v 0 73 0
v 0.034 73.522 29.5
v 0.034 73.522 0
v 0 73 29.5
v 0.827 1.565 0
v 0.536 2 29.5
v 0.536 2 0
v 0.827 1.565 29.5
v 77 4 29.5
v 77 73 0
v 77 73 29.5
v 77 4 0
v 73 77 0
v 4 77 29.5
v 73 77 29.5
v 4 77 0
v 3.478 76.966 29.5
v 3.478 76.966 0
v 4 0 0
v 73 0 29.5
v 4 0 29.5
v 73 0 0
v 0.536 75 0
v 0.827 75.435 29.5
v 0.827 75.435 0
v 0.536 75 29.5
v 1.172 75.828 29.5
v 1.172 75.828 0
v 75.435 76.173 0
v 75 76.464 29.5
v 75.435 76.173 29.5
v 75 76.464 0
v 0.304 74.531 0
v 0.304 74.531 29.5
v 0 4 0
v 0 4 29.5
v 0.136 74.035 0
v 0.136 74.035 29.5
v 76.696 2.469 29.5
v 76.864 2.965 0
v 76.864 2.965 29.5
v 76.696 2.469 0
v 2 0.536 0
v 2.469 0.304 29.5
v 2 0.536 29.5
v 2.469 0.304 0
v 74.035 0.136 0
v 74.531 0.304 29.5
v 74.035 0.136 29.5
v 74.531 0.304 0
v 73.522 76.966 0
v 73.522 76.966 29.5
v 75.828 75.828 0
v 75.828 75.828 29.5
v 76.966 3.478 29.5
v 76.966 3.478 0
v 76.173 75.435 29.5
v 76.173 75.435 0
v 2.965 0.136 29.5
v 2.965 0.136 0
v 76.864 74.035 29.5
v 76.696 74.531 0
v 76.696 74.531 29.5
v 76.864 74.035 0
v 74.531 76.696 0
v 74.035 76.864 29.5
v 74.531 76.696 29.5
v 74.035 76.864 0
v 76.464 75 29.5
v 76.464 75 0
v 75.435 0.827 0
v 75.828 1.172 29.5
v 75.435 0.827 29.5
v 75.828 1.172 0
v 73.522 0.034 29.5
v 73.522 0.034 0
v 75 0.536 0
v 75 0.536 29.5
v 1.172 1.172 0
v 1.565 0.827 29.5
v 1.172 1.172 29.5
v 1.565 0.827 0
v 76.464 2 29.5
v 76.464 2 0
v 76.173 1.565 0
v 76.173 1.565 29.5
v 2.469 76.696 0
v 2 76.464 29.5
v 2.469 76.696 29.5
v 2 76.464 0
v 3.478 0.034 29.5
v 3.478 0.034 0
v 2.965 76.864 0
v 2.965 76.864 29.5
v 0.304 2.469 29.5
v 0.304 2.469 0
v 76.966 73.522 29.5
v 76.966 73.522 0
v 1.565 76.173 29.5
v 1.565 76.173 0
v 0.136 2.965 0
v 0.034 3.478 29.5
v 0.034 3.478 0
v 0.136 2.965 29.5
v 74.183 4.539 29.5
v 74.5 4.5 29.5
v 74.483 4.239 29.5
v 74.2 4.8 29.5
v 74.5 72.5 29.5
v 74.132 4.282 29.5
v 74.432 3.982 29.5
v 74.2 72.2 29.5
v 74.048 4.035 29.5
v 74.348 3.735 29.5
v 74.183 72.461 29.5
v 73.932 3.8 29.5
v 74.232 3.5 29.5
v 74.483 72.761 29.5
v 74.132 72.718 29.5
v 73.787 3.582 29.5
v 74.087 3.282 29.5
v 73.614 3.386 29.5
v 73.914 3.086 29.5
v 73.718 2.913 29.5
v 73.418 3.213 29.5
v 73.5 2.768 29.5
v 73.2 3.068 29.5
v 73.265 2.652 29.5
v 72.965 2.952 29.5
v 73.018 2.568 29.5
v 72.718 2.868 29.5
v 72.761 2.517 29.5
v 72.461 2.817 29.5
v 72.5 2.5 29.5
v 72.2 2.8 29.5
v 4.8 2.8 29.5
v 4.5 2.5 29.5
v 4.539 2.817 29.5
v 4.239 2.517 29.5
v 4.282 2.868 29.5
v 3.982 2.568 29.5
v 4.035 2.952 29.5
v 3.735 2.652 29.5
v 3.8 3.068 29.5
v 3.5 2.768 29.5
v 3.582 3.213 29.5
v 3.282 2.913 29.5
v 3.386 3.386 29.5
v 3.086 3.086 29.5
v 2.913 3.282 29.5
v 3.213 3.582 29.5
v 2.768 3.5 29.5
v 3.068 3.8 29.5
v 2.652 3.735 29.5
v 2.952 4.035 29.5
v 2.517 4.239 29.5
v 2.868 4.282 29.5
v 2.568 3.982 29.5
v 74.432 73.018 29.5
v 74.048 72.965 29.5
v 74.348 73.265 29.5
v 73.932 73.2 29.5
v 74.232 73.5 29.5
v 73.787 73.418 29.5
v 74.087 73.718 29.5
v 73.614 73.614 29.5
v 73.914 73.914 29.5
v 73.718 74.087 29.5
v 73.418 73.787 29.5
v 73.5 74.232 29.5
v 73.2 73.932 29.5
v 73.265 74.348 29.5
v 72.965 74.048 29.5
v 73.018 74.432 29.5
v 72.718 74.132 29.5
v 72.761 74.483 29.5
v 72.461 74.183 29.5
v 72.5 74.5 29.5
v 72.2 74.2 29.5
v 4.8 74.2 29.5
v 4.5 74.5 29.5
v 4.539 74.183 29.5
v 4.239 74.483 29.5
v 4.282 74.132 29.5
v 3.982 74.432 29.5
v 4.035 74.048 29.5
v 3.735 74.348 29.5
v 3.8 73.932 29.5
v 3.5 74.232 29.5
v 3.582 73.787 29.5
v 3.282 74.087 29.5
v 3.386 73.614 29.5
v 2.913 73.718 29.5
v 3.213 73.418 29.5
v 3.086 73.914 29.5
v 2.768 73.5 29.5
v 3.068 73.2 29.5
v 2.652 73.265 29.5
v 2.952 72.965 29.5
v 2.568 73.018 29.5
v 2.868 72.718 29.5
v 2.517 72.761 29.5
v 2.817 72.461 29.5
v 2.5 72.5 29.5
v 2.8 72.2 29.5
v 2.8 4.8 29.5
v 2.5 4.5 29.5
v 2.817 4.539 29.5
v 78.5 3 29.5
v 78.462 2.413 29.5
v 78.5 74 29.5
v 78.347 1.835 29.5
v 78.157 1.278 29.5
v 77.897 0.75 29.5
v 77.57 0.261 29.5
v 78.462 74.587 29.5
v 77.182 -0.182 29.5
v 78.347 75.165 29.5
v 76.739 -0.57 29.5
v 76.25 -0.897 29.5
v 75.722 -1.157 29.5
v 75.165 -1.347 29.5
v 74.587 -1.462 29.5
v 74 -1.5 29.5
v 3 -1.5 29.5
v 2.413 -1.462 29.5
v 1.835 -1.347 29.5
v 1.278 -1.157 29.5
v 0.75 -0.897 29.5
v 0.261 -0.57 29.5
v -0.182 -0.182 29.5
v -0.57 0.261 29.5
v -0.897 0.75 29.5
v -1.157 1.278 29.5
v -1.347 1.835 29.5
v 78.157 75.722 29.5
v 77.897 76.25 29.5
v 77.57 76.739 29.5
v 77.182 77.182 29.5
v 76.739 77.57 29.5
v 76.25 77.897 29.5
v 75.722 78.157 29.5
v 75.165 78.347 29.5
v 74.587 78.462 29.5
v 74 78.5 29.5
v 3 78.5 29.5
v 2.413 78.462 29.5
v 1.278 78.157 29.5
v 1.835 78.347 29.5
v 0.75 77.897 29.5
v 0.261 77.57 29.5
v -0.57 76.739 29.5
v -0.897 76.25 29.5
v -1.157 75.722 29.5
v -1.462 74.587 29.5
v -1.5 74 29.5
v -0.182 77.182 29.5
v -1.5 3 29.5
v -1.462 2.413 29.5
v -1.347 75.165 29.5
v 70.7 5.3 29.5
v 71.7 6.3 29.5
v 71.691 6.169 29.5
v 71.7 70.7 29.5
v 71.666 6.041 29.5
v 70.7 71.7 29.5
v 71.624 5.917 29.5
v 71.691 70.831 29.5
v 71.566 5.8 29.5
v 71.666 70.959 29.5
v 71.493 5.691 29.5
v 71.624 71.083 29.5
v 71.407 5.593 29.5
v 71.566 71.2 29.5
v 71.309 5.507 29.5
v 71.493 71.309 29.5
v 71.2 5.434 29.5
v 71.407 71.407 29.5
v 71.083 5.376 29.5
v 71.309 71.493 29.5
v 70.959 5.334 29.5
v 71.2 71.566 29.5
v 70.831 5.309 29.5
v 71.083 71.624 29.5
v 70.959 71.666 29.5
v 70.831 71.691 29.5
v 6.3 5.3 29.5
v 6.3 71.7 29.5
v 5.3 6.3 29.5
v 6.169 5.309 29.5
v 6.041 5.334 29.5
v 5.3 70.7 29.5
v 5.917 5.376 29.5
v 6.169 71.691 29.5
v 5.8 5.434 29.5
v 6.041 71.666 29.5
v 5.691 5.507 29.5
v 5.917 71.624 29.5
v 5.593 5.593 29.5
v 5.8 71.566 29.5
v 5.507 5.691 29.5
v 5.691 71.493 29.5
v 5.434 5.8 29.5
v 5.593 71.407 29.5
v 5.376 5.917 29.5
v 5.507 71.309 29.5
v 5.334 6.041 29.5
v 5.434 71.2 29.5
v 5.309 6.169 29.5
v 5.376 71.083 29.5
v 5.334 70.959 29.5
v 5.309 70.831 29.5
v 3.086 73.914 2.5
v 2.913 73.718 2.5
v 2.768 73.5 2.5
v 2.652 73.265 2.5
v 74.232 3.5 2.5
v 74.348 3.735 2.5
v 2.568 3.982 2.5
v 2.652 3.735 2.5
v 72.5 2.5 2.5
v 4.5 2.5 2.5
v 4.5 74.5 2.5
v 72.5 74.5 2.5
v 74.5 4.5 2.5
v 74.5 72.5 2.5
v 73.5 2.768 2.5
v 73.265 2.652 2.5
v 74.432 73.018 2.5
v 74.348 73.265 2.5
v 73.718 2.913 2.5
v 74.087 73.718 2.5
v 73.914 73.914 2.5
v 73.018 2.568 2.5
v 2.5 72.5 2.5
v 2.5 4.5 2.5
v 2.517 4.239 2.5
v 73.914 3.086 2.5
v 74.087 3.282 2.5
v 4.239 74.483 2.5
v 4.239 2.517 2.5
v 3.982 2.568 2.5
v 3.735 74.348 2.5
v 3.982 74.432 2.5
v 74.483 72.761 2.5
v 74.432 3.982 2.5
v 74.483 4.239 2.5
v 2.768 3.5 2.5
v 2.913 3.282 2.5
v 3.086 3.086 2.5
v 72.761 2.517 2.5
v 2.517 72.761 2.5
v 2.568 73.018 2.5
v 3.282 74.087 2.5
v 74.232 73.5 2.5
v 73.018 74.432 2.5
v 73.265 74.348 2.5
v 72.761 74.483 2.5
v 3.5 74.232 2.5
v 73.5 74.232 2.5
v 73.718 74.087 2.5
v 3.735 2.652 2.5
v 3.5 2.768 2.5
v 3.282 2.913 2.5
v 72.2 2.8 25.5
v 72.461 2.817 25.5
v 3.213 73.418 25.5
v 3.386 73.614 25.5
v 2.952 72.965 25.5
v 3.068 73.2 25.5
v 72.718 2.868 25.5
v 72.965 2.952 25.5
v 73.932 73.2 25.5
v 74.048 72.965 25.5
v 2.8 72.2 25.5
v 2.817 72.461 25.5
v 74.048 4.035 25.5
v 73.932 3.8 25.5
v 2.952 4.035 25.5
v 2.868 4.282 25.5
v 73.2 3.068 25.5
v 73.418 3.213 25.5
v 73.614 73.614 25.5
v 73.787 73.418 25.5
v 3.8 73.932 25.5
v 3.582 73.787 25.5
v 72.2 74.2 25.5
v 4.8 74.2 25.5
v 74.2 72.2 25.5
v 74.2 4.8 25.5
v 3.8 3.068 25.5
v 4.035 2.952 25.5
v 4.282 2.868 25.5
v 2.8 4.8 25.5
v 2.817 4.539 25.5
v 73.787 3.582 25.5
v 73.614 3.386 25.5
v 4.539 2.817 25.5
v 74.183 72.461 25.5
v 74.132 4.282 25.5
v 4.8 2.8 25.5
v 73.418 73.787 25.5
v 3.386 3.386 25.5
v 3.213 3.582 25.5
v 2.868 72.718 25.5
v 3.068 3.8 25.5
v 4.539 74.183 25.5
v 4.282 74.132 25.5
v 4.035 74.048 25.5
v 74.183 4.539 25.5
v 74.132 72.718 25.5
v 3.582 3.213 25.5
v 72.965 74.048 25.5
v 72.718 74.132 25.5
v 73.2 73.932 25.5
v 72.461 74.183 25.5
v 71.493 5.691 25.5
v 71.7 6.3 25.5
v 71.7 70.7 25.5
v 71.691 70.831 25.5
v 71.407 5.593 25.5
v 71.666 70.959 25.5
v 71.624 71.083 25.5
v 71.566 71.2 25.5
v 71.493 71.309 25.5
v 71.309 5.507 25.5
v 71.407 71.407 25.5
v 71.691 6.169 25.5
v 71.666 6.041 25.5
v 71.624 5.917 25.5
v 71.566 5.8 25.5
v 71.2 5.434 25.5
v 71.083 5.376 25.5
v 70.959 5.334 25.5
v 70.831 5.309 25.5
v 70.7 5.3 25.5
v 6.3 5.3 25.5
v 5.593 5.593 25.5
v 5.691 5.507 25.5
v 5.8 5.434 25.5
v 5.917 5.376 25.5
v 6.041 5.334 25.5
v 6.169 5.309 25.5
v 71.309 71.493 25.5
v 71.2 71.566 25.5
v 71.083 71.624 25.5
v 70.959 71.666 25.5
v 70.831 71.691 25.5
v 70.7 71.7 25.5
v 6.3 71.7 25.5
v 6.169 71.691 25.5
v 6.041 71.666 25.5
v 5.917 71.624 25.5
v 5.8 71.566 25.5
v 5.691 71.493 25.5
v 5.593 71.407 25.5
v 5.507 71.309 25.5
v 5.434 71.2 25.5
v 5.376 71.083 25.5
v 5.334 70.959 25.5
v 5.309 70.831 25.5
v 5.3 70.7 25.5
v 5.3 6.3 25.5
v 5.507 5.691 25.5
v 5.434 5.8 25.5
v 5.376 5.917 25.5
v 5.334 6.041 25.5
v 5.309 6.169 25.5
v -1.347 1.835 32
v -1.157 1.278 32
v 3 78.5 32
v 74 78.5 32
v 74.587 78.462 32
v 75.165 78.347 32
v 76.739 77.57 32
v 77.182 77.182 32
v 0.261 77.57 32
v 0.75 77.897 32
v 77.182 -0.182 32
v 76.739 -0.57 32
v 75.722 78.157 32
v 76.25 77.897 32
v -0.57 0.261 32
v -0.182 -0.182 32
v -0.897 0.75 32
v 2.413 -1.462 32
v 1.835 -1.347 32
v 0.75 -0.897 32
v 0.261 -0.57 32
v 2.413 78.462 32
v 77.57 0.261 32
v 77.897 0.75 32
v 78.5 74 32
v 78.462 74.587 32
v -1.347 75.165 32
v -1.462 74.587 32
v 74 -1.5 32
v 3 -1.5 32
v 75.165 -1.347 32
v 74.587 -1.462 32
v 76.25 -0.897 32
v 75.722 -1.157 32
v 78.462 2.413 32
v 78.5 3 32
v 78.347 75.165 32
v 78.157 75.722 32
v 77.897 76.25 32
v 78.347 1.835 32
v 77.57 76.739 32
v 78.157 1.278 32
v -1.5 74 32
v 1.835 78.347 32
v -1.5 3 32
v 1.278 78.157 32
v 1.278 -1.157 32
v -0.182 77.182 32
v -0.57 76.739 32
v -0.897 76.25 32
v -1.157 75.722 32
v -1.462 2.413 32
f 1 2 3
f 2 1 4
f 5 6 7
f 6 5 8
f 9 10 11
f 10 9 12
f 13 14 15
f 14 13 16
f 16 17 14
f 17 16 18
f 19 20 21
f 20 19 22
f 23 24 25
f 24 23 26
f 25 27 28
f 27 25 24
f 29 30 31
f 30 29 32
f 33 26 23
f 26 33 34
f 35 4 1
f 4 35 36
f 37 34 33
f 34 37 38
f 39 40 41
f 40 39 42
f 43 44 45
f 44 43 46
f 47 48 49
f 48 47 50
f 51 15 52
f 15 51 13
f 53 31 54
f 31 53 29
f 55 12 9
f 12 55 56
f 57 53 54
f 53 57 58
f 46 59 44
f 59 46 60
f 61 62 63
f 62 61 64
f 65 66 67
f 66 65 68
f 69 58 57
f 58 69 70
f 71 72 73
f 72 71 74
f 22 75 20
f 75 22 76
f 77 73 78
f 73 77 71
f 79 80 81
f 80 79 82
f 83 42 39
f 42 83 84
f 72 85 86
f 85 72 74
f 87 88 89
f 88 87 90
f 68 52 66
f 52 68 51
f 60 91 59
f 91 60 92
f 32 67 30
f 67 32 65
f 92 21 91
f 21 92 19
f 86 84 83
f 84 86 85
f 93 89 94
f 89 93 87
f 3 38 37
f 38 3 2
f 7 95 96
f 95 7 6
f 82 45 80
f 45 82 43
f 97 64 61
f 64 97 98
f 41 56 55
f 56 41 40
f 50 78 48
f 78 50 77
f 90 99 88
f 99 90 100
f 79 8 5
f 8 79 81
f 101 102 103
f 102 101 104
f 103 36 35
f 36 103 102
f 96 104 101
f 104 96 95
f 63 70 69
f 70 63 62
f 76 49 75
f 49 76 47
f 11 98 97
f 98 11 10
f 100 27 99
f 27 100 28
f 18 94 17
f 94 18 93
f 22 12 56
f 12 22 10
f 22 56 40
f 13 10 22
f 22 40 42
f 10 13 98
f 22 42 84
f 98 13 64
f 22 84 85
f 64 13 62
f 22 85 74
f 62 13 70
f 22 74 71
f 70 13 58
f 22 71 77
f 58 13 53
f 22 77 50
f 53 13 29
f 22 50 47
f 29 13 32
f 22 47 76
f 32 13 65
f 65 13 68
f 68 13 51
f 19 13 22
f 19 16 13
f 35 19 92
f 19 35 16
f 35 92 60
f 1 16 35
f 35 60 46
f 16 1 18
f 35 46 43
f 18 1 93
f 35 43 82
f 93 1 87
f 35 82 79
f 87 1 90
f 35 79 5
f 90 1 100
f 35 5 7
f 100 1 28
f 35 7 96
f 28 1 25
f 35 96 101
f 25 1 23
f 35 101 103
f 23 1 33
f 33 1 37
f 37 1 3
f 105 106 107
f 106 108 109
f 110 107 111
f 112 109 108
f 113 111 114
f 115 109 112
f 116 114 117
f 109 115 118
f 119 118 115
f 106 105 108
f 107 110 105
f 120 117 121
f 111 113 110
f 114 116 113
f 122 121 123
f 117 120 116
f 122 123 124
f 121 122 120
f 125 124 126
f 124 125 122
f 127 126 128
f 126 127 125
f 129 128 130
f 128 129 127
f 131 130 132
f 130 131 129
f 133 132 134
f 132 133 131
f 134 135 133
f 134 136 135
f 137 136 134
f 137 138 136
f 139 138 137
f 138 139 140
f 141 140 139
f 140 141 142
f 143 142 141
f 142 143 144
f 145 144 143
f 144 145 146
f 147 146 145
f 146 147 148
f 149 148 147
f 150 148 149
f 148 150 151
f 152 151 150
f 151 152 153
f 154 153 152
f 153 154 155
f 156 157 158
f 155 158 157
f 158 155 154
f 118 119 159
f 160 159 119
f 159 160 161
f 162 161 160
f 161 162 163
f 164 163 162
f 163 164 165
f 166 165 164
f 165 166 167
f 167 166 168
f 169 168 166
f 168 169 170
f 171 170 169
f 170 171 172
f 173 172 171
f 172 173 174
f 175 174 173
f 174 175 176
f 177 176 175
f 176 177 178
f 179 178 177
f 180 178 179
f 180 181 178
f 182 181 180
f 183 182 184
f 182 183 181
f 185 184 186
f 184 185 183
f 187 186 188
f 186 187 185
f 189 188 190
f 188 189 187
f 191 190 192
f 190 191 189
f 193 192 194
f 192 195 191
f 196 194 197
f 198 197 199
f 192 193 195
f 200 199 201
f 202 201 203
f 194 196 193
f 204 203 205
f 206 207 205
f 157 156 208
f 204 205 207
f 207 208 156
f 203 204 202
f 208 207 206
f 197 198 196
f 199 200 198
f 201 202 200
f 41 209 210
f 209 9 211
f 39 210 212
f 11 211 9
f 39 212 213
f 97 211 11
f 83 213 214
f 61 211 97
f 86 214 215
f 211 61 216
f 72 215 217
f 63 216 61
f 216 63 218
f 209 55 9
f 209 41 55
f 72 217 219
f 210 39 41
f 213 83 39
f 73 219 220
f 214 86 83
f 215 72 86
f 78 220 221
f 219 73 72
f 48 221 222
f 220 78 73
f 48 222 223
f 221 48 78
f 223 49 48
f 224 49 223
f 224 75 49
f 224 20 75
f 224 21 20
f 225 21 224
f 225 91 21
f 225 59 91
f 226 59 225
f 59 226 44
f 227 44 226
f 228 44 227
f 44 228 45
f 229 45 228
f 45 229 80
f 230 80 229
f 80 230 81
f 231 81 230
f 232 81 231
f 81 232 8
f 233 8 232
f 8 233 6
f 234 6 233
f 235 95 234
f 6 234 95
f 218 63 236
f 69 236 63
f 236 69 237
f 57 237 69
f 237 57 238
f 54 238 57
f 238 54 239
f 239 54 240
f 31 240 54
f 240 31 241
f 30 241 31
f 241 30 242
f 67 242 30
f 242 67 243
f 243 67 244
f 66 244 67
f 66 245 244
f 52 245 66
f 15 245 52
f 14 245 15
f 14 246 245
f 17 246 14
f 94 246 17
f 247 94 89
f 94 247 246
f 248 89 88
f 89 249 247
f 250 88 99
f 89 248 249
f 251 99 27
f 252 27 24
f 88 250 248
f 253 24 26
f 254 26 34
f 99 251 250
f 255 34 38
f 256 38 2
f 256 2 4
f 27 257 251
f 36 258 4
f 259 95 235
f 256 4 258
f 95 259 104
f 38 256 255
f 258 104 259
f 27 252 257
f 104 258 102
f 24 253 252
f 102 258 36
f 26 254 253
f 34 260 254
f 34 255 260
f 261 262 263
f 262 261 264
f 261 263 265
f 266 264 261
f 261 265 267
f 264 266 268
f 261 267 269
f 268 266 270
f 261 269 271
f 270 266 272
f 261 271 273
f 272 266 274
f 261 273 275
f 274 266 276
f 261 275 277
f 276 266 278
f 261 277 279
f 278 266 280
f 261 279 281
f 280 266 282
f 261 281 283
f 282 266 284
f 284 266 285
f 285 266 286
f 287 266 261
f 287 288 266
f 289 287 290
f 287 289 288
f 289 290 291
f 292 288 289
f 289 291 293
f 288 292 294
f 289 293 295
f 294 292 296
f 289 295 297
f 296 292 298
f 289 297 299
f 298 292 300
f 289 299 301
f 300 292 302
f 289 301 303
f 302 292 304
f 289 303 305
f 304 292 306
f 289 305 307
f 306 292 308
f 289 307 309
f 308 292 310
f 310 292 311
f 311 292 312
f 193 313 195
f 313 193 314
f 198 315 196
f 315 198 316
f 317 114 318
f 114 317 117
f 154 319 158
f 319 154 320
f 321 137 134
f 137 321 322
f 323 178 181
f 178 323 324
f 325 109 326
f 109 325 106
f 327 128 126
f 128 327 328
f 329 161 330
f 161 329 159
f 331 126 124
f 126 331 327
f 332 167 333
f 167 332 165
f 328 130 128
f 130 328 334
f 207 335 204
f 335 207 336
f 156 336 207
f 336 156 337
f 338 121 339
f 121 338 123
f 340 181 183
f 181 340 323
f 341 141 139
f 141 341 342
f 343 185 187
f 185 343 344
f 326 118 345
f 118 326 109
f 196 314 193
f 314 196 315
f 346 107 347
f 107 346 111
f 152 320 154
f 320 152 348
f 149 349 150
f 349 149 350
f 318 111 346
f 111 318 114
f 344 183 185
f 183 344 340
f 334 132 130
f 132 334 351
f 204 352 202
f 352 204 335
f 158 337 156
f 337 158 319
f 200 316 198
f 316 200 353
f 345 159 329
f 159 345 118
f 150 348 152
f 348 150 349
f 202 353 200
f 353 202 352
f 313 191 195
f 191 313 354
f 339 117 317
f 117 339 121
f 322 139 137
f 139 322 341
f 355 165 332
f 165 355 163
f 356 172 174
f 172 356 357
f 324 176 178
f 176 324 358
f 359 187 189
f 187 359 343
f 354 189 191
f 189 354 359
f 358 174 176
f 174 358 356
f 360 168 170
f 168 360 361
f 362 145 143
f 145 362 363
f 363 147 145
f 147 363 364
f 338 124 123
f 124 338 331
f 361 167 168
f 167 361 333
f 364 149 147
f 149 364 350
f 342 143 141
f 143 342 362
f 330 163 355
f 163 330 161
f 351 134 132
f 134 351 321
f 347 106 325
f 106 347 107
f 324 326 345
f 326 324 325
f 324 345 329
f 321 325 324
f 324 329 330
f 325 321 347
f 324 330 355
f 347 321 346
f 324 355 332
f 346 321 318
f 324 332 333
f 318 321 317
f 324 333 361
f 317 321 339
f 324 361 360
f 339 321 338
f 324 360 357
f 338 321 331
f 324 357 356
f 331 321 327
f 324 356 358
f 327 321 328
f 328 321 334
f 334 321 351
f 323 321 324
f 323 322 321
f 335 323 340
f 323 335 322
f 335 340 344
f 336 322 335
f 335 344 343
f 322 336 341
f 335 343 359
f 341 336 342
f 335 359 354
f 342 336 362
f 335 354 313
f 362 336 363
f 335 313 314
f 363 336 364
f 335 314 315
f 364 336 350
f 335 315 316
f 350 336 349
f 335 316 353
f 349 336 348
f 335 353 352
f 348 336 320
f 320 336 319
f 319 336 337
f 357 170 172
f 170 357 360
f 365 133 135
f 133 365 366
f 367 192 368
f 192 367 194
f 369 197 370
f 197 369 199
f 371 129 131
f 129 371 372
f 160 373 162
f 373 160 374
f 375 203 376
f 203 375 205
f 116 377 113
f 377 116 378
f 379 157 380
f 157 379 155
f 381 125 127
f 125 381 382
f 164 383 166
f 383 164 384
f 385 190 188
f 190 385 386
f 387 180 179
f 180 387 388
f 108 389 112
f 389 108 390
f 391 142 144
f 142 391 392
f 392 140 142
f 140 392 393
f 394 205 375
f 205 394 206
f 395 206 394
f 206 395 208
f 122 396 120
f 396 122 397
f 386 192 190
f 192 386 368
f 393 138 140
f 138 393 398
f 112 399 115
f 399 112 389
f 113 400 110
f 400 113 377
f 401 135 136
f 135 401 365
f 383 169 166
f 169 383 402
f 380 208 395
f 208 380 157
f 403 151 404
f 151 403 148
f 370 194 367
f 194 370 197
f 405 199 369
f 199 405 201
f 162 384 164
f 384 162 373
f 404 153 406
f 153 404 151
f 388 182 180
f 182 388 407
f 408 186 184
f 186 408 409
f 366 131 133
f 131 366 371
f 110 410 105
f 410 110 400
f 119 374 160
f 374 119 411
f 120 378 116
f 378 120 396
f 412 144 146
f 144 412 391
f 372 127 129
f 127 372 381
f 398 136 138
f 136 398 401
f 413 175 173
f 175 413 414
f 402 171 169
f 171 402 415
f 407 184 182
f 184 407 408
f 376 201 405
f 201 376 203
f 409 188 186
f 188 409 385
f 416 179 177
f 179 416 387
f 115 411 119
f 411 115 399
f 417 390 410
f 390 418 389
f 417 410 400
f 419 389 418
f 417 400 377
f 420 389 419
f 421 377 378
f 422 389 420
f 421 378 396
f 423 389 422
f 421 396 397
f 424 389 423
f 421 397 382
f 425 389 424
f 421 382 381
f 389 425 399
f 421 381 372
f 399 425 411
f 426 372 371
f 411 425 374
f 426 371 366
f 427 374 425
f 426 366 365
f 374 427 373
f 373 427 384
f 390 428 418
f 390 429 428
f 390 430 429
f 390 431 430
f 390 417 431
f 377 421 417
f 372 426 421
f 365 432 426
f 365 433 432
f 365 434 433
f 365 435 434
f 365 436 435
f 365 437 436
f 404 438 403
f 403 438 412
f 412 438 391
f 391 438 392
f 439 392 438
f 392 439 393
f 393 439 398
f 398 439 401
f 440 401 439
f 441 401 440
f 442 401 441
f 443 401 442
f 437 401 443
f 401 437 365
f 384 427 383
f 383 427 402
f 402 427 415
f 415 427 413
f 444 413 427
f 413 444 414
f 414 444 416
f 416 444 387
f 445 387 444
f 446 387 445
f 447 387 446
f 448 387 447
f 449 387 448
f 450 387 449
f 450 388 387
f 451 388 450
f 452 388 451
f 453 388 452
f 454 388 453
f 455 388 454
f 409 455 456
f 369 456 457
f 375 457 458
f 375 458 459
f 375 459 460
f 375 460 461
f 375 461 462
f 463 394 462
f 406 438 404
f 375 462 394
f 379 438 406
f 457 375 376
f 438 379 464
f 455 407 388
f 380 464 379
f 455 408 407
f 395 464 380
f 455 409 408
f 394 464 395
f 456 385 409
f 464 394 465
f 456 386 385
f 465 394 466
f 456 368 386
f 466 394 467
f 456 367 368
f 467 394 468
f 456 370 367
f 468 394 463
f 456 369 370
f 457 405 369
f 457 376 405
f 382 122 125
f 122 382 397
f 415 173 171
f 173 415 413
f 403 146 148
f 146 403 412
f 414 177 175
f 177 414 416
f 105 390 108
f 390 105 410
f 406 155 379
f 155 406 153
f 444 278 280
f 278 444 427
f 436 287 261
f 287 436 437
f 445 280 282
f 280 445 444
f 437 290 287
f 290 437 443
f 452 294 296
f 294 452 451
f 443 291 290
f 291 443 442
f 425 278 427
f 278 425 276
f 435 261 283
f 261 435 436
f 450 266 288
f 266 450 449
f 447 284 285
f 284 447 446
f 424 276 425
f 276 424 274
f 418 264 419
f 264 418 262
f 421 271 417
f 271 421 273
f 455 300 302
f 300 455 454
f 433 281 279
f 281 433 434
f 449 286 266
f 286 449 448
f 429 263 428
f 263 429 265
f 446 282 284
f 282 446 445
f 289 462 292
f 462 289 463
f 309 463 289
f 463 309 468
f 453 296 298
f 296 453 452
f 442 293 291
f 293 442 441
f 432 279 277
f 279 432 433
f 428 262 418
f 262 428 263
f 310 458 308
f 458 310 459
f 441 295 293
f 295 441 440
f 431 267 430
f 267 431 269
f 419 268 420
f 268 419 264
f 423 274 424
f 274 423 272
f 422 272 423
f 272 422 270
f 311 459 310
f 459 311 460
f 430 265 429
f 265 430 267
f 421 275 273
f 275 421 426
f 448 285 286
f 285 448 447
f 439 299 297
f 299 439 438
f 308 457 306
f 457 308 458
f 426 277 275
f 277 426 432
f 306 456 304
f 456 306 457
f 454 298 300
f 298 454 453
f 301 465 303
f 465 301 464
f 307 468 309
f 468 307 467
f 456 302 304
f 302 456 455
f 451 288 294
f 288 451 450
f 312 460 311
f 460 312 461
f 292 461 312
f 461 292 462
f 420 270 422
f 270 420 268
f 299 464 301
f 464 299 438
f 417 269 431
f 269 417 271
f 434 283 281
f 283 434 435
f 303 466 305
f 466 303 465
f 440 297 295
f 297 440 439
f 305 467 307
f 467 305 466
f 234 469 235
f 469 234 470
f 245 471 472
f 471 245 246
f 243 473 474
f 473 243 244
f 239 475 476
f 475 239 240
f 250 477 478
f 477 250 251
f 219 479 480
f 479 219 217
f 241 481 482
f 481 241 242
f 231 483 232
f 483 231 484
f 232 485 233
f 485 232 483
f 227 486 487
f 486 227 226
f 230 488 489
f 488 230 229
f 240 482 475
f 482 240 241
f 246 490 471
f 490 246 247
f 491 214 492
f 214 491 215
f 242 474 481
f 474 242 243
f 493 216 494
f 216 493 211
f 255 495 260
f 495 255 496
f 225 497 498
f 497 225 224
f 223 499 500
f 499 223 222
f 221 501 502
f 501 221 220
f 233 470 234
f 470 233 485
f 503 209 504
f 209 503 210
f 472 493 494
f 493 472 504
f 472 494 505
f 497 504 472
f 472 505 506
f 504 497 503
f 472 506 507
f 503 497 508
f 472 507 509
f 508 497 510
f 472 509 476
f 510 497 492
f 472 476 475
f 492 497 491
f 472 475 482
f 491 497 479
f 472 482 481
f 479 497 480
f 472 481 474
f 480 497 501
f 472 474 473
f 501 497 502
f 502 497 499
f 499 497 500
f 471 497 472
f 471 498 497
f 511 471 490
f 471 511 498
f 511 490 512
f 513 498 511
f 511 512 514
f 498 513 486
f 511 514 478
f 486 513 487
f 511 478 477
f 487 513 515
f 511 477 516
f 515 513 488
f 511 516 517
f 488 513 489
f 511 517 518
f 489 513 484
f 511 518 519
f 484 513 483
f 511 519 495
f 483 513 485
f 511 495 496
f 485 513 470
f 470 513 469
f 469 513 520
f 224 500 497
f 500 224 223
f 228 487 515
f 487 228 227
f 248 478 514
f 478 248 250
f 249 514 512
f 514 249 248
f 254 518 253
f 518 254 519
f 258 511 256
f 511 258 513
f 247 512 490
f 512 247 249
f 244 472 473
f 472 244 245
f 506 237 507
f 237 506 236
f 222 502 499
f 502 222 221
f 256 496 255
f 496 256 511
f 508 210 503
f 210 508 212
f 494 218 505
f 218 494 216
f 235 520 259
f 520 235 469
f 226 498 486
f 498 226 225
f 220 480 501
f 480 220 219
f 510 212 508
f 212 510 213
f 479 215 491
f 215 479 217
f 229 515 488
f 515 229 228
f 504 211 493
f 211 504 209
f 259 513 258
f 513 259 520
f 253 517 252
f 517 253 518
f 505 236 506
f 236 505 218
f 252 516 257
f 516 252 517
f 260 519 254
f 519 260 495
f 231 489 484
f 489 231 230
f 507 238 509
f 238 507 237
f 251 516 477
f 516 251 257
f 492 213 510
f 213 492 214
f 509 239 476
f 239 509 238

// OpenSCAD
$fn = 48;

// Units: mm
wall = 2.5;
clearance = 0.30;

cavity_x = 72;
cavity_y = 72;
cavity_z = 23;

bottom_thick = wall;
base_wall_h = cavity_z + 4;
base_outer_x = cavity_x + 2 * wall;
base_outer_y = cavity_y + 2 * wall;
base_outer_z = bottom_thick + base_wall_h;

lid_top_thick = wall;
lid_overhang = 1.5;
lid_outer_x = base_outer_x + 2 * lid_overhang;
lid_outer_y = base_outer_y + 2 * lid_overhang;

plug_depth = 4;
plug_wall = wall;
plug_outer_x = cavity_x - 2 * clearance;
plug_outer_y = cavity_y - 2 * clearance;
plug_inner_x = plug_outer_x - 2 * plug_wall;
plug_inner_y = plug_outer_y - 2 * plug_wall;

module rounded_box(size, r) {
    x = size[0];
    y = size[1];
    z = size[2];

    hull() {
        translate([r, r, 0]) cylinder(h = z, r = r);
        translate([x - r, r, 0]) cylinder(h = z, r = r);
        translate([r, y - r, 0]) cylinder(h = z, r = r);
        translate([x - r, y - r, 0]) cylinder(h = z, r = r);
    }
}

module base() {
    difference() {
        rounded_box([base_outer_x, base_outer_y, base_outer_z], 4);

        translate([wall, wall, bottom_thick])
            rounded_box([cavity_x, cavity_y, base_wall_h + 0.2], 2);
    }
}

module lid() {
    union() {
        translate([-lid_overhang, -lid_overhang, base_outer_z])
            rounded_box([lid_outer_x, lid_outer_y, lid_top_thick], 4.5);

        translate([
            wall + clearance,
            wall + clearance,
            base_outer_z - plug_depth
        ])
            difference() {
                rounded_box([plug_outer_x, plug_outer_y, plug_depth], 2);
                translate([plug_wall, plug_wall, -0.1])
                    rounded_box([plug_inner_x, plug_inner_y, plug_depth + 0.2], 1);
            }
    }
}

base();
lid();
